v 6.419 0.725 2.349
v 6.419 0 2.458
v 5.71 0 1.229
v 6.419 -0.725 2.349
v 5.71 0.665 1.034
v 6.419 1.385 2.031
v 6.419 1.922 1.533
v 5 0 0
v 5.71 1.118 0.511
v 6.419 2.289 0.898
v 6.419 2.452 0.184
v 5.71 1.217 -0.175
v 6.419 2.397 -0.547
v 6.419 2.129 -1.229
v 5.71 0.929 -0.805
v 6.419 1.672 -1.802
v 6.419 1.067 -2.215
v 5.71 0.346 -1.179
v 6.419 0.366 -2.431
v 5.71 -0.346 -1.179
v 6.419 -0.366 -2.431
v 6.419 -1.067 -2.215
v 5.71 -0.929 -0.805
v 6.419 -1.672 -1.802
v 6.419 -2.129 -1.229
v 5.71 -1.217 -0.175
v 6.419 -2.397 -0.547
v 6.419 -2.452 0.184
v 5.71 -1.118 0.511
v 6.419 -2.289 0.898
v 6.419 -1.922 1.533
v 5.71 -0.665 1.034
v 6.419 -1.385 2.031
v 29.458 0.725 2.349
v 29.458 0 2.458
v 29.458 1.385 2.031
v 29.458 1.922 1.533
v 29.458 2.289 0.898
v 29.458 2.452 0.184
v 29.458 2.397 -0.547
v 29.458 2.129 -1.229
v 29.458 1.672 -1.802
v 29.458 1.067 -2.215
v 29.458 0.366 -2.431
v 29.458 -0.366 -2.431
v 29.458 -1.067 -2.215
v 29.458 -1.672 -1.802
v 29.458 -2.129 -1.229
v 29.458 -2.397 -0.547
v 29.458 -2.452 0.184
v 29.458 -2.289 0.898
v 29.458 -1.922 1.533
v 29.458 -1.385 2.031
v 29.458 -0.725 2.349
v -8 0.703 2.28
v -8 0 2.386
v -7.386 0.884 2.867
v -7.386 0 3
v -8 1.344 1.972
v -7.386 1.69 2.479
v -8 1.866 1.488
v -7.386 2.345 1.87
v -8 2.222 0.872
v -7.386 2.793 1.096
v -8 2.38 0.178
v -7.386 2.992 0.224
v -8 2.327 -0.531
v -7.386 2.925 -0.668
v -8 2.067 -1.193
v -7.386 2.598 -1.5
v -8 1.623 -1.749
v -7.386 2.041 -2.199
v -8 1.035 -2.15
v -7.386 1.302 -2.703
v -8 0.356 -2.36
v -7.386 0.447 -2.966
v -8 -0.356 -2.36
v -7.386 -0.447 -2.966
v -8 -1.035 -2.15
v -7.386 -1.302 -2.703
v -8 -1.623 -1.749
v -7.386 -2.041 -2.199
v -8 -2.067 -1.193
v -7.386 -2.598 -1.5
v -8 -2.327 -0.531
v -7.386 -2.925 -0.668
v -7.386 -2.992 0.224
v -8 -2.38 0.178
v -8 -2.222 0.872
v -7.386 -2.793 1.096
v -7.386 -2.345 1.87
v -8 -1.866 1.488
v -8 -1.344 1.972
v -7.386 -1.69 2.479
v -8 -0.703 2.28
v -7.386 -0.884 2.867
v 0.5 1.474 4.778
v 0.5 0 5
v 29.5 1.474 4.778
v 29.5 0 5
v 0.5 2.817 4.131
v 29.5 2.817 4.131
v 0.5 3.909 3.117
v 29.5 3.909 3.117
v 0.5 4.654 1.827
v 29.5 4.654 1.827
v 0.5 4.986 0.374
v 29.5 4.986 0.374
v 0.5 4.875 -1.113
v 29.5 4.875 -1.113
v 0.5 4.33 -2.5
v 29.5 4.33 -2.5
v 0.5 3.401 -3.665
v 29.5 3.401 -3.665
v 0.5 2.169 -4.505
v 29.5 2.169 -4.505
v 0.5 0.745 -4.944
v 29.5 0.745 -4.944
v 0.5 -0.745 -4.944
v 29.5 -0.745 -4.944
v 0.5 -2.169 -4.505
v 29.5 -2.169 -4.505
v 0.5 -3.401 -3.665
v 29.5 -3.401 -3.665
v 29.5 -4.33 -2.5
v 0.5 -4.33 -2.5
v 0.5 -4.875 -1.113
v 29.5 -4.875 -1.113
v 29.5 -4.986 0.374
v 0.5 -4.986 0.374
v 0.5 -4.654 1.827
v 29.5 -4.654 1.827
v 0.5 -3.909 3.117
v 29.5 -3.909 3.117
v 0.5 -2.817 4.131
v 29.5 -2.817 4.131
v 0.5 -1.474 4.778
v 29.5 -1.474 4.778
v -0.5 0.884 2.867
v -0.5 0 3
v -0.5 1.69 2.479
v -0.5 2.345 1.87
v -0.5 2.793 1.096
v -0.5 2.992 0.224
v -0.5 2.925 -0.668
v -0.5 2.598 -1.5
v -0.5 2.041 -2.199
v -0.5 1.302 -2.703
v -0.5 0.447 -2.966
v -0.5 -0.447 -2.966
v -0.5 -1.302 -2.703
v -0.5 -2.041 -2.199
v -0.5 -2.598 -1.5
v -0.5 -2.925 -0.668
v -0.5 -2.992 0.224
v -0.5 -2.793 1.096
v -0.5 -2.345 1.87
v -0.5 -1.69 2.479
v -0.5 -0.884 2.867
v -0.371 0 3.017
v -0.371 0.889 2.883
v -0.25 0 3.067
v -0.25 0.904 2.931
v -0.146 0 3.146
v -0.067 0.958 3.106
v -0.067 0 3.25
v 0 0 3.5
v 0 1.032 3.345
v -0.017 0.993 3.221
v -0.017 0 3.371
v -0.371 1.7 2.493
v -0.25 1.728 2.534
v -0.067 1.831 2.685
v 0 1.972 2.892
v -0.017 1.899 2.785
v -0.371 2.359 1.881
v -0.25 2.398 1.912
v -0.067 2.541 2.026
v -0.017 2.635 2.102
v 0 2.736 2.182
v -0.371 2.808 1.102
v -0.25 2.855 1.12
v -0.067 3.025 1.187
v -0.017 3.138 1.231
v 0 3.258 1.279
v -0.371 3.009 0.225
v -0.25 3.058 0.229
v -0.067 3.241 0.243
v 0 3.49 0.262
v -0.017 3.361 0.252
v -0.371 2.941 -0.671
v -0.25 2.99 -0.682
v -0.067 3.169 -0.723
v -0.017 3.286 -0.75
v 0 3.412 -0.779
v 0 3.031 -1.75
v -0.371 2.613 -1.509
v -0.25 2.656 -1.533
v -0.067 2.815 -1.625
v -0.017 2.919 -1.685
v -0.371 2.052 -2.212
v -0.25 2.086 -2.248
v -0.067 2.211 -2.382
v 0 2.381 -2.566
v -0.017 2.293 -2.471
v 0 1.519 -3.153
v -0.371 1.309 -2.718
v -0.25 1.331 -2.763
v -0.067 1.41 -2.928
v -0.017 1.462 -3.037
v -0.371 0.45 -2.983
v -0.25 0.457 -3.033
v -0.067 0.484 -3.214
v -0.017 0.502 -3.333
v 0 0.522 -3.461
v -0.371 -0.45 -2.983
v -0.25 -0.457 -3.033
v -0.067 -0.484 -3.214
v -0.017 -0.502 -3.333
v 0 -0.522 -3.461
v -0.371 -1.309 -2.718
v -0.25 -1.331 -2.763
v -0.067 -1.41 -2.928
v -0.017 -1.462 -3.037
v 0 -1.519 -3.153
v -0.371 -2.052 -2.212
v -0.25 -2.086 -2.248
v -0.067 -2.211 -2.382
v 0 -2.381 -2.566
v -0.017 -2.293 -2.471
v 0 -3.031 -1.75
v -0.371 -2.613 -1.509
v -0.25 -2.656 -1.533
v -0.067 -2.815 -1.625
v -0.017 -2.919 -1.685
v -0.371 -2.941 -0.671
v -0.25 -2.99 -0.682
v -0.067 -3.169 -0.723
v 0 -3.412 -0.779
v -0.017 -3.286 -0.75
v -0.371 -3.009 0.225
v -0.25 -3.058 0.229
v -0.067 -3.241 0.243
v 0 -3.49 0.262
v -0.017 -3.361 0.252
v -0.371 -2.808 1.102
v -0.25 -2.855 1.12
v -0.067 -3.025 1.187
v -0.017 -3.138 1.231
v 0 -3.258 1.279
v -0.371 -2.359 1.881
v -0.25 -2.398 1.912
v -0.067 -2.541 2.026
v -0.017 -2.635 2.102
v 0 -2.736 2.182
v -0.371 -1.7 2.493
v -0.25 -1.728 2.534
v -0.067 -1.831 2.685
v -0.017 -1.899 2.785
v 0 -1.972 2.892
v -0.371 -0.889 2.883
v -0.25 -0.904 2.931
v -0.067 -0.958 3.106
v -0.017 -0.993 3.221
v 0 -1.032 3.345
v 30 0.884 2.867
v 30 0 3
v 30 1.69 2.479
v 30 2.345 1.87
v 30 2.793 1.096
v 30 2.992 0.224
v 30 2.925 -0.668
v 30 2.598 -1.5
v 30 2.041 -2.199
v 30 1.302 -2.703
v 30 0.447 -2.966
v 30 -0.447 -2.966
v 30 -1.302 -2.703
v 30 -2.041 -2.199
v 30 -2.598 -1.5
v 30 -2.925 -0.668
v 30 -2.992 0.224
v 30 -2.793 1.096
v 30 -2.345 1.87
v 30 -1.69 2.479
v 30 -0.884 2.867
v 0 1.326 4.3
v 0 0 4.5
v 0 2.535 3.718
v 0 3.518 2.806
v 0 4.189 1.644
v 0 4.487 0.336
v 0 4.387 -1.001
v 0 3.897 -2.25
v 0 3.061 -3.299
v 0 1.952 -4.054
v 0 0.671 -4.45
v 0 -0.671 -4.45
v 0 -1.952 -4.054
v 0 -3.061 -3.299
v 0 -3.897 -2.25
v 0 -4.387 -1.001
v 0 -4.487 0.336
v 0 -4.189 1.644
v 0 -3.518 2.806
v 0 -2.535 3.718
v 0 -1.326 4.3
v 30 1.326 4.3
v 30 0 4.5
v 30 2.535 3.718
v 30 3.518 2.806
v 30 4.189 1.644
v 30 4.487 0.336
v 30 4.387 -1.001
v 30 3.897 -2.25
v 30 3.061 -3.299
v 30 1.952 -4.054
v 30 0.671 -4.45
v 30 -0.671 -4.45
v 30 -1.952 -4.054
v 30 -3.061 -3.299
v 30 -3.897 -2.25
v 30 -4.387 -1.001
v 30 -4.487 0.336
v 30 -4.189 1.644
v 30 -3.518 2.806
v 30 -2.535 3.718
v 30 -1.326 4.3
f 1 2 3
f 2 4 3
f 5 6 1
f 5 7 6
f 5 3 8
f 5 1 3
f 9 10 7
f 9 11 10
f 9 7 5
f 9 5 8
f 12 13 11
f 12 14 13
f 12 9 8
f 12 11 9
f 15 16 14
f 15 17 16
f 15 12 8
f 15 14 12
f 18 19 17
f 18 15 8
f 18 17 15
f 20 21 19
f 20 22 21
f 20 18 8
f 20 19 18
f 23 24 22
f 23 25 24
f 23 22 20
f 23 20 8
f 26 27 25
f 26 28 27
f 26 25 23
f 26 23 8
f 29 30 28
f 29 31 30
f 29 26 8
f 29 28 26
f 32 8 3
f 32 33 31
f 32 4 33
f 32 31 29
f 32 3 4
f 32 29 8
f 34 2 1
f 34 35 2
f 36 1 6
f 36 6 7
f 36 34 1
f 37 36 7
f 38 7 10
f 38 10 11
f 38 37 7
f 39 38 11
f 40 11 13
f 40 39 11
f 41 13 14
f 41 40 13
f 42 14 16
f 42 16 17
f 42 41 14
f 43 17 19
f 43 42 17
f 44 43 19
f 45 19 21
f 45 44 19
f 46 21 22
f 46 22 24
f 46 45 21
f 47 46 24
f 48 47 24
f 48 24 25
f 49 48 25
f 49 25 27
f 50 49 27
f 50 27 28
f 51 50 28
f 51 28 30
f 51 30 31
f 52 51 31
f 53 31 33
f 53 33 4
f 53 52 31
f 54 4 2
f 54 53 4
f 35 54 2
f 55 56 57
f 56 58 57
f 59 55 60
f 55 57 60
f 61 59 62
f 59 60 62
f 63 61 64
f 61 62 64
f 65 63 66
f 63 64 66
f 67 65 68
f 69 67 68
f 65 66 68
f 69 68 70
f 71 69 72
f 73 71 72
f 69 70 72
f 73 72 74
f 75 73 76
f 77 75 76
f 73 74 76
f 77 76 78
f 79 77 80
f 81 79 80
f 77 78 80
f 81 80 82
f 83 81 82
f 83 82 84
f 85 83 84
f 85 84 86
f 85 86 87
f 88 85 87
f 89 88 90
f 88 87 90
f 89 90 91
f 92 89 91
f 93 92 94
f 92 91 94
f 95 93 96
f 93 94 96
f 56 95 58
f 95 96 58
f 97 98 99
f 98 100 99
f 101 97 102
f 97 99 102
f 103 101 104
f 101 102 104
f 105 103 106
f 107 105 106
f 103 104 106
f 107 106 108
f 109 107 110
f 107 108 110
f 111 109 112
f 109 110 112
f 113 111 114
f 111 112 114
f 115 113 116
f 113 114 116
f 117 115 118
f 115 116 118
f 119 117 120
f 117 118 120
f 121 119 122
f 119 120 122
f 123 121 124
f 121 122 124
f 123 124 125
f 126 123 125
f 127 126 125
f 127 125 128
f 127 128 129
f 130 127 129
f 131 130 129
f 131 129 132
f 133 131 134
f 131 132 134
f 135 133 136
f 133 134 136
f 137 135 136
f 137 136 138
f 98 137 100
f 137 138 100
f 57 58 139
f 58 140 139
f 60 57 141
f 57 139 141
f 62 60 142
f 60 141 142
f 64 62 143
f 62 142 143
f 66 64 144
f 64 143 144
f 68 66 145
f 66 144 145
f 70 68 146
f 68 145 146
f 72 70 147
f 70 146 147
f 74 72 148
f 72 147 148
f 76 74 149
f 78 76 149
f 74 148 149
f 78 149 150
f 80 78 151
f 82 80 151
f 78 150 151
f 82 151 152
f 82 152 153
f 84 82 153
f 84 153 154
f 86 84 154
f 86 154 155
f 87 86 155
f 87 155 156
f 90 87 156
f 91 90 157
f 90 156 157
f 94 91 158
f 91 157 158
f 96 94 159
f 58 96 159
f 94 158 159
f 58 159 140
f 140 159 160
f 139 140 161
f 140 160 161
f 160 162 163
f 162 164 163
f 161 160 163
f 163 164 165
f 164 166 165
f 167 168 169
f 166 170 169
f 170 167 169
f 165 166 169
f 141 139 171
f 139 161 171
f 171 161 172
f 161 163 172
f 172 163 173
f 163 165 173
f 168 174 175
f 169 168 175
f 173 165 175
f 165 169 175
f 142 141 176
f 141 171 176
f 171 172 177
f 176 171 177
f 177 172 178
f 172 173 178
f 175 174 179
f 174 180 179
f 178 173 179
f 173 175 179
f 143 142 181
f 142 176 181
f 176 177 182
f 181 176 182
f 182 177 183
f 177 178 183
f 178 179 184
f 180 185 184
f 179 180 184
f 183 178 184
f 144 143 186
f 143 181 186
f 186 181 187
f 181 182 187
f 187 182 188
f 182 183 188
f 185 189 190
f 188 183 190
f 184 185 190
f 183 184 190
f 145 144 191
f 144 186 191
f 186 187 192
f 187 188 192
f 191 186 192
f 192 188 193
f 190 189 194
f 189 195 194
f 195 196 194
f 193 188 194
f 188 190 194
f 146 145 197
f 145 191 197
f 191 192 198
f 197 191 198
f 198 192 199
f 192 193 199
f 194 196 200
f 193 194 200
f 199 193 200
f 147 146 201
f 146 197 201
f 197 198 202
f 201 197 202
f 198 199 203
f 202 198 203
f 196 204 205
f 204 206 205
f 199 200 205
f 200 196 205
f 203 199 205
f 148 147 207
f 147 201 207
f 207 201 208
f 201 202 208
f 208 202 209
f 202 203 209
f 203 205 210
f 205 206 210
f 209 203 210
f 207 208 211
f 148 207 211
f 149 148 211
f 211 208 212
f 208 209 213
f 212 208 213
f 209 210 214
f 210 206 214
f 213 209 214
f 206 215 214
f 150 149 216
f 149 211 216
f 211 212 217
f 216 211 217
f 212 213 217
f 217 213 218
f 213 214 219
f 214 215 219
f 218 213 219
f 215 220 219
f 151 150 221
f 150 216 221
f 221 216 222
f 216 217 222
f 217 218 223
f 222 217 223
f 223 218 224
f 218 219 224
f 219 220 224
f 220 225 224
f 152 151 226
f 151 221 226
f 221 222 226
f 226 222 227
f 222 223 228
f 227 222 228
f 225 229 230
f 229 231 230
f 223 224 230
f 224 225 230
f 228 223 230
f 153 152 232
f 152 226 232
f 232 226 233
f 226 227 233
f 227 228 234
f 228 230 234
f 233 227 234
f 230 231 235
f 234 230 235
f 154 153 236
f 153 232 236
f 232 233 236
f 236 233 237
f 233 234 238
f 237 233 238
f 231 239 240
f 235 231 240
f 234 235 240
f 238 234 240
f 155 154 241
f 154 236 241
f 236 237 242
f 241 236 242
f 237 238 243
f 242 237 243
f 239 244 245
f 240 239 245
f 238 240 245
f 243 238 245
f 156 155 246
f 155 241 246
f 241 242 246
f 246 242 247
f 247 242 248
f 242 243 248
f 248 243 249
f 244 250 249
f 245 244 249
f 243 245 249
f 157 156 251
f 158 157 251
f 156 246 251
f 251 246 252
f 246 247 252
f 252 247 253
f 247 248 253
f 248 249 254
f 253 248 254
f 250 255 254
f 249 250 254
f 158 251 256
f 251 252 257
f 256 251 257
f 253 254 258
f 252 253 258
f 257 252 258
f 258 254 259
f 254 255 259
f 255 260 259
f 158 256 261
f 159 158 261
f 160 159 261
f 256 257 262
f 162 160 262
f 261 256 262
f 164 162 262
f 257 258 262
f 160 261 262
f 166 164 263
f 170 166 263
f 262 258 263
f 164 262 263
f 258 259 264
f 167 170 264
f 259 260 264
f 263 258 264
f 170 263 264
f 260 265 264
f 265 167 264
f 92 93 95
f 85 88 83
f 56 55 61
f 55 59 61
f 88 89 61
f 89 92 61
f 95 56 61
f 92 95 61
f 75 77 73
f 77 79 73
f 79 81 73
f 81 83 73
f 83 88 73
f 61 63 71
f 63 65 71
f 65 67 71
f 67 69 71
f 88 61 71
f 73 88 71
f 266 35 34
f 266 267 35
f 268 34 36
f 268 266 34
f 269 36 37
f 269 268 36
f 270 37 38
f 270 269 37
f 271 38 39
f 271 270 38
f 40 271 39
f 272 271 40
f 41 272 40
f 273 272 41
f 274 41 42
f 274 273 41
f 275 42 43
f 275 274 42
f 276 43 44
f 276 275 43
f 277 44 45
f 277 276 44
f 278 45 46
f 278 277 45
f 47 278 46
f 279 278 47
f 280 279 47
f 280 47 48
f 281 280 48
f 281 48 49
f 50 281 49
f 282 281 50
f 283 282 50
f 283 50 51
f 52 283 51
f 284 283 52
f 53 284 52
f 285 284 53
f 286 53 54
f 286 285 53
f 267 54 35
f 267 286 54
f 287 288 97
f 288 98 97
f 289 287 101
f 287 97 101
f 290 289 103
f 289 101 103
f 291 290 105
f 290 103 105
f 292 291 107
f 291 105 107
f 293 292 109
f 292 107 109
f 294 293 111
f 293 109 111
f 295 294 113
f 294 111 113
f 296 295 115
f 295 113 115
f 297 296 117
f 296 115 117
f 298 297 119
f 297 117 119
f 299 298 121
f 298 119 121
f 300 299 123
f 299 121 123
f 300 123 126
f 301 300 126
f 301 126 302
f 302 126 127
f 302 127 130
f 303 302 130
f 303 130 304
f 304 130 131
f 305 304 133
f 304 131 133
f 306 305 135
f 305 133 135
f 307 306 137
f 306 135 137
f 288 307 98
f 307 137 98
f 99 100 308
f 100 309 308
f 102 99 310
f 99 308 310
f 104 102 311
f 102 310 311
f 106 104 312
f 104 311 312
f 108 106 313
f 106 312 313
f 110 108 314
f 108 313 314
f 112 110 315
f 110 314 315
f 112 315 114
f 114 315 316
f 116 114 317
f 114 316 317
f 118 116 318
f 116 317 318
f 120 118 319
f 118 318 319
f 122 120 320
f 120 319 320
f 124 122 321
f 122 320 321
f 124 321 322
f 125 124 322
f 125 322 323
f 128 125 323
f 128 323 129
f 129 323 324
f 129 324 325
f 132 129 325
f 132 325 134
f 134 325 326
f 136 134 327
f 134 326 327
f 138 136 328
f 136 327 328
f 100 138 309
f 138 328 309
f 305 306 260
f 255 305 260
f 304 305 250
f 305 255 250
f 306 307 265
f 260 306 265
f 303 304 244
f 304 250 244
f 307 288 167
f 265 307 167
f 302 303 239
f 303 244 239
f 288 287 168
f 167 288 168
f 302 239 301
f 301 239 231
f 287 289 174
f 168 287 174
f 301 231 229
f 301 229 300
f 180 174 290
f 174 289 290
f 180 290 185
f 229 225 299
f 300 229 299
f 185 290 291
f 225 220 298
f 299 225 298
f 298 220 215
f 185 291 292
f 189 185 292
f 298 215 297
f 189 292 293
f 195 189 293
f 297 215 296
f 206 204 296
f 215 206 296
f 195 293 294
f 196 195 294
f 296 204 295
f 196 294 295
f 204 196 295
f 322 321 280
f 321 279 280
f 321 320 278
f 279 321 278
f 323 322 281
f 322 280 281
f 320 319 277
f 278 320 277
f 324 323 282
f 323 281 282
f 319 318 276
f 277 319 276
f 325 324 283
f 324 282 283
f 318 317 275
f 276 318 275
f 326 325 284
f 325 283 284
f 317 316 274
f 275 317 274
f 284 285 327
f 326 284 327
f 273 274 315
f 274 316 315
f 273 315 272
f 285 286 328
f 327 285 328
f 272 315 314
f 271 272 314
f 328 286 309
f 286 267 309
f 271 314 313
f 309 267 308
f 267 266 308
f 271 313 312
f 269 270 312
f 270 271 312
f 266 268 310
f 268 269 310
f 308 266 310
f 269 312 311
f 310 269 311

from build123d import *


with BuildPart() as part:
    # Sketch1 → Revolve1 (revolve)
    with BuildSketch(Plane.XY, mode=Mode.PRIVATE) as revolve1_sk:
        Polygon((0, 0), (0, 4.5), (0.5, 5), (29.5, 5), (30, 4.5), (30, 0), align=None)
    revolve(revolve1_sk.sketch.rotate(Axis((30, 0, 0), (-1, 0, 0)), 270), axis=Axis((30, 0, 0), (-1, 0, 0)))

    # Sketch2 → Revolve2 (revolve)
    with BuildSketch(Plane.XY, mode=Mode.PRIVATE) as revolve2_sk:
        with BuildLine():
            Line((-8, 0), (-8, 2.3865))
            Line((-8, 2.3865), (-7.3865, 3))
            Line((-7.3865, 3), (-0.5, 3))
            ThreePointArc((-0.5, 3), (-0.146446609, 3.146446609), (0, 3.5))
            Line((0, 3.5), (0, 0))
            Line((0, 0), (-8, 0))
        make_face()
    revolve(revolve2_sk.sketch.rotate(Axis((0, 0, 0), (-1, 0, 0)), 270), axis=Axis((0, 0, 0), (-1, 0, 0)))

    # Sketch3 → Cut-Revolve1 (revolve, cut)
    with BuildSketch(Plane.XY, mode=Mode.PRIVATE) as cut_revolve1_sk:
        Polygon((5, 0), (6.419415637, 2.4585), (29.4585, 2.4585), (30, 3), (30, 0), align=None)
    revolve(cut_revolve1_sk.sketch.rotate(Axis((30, 0, 0), (-1, 0, 0)), 270), axis=Axis((30, 0, 0), (-1, 0, 0)), mode=Mode.SUBTRACT)


solid = part.part
